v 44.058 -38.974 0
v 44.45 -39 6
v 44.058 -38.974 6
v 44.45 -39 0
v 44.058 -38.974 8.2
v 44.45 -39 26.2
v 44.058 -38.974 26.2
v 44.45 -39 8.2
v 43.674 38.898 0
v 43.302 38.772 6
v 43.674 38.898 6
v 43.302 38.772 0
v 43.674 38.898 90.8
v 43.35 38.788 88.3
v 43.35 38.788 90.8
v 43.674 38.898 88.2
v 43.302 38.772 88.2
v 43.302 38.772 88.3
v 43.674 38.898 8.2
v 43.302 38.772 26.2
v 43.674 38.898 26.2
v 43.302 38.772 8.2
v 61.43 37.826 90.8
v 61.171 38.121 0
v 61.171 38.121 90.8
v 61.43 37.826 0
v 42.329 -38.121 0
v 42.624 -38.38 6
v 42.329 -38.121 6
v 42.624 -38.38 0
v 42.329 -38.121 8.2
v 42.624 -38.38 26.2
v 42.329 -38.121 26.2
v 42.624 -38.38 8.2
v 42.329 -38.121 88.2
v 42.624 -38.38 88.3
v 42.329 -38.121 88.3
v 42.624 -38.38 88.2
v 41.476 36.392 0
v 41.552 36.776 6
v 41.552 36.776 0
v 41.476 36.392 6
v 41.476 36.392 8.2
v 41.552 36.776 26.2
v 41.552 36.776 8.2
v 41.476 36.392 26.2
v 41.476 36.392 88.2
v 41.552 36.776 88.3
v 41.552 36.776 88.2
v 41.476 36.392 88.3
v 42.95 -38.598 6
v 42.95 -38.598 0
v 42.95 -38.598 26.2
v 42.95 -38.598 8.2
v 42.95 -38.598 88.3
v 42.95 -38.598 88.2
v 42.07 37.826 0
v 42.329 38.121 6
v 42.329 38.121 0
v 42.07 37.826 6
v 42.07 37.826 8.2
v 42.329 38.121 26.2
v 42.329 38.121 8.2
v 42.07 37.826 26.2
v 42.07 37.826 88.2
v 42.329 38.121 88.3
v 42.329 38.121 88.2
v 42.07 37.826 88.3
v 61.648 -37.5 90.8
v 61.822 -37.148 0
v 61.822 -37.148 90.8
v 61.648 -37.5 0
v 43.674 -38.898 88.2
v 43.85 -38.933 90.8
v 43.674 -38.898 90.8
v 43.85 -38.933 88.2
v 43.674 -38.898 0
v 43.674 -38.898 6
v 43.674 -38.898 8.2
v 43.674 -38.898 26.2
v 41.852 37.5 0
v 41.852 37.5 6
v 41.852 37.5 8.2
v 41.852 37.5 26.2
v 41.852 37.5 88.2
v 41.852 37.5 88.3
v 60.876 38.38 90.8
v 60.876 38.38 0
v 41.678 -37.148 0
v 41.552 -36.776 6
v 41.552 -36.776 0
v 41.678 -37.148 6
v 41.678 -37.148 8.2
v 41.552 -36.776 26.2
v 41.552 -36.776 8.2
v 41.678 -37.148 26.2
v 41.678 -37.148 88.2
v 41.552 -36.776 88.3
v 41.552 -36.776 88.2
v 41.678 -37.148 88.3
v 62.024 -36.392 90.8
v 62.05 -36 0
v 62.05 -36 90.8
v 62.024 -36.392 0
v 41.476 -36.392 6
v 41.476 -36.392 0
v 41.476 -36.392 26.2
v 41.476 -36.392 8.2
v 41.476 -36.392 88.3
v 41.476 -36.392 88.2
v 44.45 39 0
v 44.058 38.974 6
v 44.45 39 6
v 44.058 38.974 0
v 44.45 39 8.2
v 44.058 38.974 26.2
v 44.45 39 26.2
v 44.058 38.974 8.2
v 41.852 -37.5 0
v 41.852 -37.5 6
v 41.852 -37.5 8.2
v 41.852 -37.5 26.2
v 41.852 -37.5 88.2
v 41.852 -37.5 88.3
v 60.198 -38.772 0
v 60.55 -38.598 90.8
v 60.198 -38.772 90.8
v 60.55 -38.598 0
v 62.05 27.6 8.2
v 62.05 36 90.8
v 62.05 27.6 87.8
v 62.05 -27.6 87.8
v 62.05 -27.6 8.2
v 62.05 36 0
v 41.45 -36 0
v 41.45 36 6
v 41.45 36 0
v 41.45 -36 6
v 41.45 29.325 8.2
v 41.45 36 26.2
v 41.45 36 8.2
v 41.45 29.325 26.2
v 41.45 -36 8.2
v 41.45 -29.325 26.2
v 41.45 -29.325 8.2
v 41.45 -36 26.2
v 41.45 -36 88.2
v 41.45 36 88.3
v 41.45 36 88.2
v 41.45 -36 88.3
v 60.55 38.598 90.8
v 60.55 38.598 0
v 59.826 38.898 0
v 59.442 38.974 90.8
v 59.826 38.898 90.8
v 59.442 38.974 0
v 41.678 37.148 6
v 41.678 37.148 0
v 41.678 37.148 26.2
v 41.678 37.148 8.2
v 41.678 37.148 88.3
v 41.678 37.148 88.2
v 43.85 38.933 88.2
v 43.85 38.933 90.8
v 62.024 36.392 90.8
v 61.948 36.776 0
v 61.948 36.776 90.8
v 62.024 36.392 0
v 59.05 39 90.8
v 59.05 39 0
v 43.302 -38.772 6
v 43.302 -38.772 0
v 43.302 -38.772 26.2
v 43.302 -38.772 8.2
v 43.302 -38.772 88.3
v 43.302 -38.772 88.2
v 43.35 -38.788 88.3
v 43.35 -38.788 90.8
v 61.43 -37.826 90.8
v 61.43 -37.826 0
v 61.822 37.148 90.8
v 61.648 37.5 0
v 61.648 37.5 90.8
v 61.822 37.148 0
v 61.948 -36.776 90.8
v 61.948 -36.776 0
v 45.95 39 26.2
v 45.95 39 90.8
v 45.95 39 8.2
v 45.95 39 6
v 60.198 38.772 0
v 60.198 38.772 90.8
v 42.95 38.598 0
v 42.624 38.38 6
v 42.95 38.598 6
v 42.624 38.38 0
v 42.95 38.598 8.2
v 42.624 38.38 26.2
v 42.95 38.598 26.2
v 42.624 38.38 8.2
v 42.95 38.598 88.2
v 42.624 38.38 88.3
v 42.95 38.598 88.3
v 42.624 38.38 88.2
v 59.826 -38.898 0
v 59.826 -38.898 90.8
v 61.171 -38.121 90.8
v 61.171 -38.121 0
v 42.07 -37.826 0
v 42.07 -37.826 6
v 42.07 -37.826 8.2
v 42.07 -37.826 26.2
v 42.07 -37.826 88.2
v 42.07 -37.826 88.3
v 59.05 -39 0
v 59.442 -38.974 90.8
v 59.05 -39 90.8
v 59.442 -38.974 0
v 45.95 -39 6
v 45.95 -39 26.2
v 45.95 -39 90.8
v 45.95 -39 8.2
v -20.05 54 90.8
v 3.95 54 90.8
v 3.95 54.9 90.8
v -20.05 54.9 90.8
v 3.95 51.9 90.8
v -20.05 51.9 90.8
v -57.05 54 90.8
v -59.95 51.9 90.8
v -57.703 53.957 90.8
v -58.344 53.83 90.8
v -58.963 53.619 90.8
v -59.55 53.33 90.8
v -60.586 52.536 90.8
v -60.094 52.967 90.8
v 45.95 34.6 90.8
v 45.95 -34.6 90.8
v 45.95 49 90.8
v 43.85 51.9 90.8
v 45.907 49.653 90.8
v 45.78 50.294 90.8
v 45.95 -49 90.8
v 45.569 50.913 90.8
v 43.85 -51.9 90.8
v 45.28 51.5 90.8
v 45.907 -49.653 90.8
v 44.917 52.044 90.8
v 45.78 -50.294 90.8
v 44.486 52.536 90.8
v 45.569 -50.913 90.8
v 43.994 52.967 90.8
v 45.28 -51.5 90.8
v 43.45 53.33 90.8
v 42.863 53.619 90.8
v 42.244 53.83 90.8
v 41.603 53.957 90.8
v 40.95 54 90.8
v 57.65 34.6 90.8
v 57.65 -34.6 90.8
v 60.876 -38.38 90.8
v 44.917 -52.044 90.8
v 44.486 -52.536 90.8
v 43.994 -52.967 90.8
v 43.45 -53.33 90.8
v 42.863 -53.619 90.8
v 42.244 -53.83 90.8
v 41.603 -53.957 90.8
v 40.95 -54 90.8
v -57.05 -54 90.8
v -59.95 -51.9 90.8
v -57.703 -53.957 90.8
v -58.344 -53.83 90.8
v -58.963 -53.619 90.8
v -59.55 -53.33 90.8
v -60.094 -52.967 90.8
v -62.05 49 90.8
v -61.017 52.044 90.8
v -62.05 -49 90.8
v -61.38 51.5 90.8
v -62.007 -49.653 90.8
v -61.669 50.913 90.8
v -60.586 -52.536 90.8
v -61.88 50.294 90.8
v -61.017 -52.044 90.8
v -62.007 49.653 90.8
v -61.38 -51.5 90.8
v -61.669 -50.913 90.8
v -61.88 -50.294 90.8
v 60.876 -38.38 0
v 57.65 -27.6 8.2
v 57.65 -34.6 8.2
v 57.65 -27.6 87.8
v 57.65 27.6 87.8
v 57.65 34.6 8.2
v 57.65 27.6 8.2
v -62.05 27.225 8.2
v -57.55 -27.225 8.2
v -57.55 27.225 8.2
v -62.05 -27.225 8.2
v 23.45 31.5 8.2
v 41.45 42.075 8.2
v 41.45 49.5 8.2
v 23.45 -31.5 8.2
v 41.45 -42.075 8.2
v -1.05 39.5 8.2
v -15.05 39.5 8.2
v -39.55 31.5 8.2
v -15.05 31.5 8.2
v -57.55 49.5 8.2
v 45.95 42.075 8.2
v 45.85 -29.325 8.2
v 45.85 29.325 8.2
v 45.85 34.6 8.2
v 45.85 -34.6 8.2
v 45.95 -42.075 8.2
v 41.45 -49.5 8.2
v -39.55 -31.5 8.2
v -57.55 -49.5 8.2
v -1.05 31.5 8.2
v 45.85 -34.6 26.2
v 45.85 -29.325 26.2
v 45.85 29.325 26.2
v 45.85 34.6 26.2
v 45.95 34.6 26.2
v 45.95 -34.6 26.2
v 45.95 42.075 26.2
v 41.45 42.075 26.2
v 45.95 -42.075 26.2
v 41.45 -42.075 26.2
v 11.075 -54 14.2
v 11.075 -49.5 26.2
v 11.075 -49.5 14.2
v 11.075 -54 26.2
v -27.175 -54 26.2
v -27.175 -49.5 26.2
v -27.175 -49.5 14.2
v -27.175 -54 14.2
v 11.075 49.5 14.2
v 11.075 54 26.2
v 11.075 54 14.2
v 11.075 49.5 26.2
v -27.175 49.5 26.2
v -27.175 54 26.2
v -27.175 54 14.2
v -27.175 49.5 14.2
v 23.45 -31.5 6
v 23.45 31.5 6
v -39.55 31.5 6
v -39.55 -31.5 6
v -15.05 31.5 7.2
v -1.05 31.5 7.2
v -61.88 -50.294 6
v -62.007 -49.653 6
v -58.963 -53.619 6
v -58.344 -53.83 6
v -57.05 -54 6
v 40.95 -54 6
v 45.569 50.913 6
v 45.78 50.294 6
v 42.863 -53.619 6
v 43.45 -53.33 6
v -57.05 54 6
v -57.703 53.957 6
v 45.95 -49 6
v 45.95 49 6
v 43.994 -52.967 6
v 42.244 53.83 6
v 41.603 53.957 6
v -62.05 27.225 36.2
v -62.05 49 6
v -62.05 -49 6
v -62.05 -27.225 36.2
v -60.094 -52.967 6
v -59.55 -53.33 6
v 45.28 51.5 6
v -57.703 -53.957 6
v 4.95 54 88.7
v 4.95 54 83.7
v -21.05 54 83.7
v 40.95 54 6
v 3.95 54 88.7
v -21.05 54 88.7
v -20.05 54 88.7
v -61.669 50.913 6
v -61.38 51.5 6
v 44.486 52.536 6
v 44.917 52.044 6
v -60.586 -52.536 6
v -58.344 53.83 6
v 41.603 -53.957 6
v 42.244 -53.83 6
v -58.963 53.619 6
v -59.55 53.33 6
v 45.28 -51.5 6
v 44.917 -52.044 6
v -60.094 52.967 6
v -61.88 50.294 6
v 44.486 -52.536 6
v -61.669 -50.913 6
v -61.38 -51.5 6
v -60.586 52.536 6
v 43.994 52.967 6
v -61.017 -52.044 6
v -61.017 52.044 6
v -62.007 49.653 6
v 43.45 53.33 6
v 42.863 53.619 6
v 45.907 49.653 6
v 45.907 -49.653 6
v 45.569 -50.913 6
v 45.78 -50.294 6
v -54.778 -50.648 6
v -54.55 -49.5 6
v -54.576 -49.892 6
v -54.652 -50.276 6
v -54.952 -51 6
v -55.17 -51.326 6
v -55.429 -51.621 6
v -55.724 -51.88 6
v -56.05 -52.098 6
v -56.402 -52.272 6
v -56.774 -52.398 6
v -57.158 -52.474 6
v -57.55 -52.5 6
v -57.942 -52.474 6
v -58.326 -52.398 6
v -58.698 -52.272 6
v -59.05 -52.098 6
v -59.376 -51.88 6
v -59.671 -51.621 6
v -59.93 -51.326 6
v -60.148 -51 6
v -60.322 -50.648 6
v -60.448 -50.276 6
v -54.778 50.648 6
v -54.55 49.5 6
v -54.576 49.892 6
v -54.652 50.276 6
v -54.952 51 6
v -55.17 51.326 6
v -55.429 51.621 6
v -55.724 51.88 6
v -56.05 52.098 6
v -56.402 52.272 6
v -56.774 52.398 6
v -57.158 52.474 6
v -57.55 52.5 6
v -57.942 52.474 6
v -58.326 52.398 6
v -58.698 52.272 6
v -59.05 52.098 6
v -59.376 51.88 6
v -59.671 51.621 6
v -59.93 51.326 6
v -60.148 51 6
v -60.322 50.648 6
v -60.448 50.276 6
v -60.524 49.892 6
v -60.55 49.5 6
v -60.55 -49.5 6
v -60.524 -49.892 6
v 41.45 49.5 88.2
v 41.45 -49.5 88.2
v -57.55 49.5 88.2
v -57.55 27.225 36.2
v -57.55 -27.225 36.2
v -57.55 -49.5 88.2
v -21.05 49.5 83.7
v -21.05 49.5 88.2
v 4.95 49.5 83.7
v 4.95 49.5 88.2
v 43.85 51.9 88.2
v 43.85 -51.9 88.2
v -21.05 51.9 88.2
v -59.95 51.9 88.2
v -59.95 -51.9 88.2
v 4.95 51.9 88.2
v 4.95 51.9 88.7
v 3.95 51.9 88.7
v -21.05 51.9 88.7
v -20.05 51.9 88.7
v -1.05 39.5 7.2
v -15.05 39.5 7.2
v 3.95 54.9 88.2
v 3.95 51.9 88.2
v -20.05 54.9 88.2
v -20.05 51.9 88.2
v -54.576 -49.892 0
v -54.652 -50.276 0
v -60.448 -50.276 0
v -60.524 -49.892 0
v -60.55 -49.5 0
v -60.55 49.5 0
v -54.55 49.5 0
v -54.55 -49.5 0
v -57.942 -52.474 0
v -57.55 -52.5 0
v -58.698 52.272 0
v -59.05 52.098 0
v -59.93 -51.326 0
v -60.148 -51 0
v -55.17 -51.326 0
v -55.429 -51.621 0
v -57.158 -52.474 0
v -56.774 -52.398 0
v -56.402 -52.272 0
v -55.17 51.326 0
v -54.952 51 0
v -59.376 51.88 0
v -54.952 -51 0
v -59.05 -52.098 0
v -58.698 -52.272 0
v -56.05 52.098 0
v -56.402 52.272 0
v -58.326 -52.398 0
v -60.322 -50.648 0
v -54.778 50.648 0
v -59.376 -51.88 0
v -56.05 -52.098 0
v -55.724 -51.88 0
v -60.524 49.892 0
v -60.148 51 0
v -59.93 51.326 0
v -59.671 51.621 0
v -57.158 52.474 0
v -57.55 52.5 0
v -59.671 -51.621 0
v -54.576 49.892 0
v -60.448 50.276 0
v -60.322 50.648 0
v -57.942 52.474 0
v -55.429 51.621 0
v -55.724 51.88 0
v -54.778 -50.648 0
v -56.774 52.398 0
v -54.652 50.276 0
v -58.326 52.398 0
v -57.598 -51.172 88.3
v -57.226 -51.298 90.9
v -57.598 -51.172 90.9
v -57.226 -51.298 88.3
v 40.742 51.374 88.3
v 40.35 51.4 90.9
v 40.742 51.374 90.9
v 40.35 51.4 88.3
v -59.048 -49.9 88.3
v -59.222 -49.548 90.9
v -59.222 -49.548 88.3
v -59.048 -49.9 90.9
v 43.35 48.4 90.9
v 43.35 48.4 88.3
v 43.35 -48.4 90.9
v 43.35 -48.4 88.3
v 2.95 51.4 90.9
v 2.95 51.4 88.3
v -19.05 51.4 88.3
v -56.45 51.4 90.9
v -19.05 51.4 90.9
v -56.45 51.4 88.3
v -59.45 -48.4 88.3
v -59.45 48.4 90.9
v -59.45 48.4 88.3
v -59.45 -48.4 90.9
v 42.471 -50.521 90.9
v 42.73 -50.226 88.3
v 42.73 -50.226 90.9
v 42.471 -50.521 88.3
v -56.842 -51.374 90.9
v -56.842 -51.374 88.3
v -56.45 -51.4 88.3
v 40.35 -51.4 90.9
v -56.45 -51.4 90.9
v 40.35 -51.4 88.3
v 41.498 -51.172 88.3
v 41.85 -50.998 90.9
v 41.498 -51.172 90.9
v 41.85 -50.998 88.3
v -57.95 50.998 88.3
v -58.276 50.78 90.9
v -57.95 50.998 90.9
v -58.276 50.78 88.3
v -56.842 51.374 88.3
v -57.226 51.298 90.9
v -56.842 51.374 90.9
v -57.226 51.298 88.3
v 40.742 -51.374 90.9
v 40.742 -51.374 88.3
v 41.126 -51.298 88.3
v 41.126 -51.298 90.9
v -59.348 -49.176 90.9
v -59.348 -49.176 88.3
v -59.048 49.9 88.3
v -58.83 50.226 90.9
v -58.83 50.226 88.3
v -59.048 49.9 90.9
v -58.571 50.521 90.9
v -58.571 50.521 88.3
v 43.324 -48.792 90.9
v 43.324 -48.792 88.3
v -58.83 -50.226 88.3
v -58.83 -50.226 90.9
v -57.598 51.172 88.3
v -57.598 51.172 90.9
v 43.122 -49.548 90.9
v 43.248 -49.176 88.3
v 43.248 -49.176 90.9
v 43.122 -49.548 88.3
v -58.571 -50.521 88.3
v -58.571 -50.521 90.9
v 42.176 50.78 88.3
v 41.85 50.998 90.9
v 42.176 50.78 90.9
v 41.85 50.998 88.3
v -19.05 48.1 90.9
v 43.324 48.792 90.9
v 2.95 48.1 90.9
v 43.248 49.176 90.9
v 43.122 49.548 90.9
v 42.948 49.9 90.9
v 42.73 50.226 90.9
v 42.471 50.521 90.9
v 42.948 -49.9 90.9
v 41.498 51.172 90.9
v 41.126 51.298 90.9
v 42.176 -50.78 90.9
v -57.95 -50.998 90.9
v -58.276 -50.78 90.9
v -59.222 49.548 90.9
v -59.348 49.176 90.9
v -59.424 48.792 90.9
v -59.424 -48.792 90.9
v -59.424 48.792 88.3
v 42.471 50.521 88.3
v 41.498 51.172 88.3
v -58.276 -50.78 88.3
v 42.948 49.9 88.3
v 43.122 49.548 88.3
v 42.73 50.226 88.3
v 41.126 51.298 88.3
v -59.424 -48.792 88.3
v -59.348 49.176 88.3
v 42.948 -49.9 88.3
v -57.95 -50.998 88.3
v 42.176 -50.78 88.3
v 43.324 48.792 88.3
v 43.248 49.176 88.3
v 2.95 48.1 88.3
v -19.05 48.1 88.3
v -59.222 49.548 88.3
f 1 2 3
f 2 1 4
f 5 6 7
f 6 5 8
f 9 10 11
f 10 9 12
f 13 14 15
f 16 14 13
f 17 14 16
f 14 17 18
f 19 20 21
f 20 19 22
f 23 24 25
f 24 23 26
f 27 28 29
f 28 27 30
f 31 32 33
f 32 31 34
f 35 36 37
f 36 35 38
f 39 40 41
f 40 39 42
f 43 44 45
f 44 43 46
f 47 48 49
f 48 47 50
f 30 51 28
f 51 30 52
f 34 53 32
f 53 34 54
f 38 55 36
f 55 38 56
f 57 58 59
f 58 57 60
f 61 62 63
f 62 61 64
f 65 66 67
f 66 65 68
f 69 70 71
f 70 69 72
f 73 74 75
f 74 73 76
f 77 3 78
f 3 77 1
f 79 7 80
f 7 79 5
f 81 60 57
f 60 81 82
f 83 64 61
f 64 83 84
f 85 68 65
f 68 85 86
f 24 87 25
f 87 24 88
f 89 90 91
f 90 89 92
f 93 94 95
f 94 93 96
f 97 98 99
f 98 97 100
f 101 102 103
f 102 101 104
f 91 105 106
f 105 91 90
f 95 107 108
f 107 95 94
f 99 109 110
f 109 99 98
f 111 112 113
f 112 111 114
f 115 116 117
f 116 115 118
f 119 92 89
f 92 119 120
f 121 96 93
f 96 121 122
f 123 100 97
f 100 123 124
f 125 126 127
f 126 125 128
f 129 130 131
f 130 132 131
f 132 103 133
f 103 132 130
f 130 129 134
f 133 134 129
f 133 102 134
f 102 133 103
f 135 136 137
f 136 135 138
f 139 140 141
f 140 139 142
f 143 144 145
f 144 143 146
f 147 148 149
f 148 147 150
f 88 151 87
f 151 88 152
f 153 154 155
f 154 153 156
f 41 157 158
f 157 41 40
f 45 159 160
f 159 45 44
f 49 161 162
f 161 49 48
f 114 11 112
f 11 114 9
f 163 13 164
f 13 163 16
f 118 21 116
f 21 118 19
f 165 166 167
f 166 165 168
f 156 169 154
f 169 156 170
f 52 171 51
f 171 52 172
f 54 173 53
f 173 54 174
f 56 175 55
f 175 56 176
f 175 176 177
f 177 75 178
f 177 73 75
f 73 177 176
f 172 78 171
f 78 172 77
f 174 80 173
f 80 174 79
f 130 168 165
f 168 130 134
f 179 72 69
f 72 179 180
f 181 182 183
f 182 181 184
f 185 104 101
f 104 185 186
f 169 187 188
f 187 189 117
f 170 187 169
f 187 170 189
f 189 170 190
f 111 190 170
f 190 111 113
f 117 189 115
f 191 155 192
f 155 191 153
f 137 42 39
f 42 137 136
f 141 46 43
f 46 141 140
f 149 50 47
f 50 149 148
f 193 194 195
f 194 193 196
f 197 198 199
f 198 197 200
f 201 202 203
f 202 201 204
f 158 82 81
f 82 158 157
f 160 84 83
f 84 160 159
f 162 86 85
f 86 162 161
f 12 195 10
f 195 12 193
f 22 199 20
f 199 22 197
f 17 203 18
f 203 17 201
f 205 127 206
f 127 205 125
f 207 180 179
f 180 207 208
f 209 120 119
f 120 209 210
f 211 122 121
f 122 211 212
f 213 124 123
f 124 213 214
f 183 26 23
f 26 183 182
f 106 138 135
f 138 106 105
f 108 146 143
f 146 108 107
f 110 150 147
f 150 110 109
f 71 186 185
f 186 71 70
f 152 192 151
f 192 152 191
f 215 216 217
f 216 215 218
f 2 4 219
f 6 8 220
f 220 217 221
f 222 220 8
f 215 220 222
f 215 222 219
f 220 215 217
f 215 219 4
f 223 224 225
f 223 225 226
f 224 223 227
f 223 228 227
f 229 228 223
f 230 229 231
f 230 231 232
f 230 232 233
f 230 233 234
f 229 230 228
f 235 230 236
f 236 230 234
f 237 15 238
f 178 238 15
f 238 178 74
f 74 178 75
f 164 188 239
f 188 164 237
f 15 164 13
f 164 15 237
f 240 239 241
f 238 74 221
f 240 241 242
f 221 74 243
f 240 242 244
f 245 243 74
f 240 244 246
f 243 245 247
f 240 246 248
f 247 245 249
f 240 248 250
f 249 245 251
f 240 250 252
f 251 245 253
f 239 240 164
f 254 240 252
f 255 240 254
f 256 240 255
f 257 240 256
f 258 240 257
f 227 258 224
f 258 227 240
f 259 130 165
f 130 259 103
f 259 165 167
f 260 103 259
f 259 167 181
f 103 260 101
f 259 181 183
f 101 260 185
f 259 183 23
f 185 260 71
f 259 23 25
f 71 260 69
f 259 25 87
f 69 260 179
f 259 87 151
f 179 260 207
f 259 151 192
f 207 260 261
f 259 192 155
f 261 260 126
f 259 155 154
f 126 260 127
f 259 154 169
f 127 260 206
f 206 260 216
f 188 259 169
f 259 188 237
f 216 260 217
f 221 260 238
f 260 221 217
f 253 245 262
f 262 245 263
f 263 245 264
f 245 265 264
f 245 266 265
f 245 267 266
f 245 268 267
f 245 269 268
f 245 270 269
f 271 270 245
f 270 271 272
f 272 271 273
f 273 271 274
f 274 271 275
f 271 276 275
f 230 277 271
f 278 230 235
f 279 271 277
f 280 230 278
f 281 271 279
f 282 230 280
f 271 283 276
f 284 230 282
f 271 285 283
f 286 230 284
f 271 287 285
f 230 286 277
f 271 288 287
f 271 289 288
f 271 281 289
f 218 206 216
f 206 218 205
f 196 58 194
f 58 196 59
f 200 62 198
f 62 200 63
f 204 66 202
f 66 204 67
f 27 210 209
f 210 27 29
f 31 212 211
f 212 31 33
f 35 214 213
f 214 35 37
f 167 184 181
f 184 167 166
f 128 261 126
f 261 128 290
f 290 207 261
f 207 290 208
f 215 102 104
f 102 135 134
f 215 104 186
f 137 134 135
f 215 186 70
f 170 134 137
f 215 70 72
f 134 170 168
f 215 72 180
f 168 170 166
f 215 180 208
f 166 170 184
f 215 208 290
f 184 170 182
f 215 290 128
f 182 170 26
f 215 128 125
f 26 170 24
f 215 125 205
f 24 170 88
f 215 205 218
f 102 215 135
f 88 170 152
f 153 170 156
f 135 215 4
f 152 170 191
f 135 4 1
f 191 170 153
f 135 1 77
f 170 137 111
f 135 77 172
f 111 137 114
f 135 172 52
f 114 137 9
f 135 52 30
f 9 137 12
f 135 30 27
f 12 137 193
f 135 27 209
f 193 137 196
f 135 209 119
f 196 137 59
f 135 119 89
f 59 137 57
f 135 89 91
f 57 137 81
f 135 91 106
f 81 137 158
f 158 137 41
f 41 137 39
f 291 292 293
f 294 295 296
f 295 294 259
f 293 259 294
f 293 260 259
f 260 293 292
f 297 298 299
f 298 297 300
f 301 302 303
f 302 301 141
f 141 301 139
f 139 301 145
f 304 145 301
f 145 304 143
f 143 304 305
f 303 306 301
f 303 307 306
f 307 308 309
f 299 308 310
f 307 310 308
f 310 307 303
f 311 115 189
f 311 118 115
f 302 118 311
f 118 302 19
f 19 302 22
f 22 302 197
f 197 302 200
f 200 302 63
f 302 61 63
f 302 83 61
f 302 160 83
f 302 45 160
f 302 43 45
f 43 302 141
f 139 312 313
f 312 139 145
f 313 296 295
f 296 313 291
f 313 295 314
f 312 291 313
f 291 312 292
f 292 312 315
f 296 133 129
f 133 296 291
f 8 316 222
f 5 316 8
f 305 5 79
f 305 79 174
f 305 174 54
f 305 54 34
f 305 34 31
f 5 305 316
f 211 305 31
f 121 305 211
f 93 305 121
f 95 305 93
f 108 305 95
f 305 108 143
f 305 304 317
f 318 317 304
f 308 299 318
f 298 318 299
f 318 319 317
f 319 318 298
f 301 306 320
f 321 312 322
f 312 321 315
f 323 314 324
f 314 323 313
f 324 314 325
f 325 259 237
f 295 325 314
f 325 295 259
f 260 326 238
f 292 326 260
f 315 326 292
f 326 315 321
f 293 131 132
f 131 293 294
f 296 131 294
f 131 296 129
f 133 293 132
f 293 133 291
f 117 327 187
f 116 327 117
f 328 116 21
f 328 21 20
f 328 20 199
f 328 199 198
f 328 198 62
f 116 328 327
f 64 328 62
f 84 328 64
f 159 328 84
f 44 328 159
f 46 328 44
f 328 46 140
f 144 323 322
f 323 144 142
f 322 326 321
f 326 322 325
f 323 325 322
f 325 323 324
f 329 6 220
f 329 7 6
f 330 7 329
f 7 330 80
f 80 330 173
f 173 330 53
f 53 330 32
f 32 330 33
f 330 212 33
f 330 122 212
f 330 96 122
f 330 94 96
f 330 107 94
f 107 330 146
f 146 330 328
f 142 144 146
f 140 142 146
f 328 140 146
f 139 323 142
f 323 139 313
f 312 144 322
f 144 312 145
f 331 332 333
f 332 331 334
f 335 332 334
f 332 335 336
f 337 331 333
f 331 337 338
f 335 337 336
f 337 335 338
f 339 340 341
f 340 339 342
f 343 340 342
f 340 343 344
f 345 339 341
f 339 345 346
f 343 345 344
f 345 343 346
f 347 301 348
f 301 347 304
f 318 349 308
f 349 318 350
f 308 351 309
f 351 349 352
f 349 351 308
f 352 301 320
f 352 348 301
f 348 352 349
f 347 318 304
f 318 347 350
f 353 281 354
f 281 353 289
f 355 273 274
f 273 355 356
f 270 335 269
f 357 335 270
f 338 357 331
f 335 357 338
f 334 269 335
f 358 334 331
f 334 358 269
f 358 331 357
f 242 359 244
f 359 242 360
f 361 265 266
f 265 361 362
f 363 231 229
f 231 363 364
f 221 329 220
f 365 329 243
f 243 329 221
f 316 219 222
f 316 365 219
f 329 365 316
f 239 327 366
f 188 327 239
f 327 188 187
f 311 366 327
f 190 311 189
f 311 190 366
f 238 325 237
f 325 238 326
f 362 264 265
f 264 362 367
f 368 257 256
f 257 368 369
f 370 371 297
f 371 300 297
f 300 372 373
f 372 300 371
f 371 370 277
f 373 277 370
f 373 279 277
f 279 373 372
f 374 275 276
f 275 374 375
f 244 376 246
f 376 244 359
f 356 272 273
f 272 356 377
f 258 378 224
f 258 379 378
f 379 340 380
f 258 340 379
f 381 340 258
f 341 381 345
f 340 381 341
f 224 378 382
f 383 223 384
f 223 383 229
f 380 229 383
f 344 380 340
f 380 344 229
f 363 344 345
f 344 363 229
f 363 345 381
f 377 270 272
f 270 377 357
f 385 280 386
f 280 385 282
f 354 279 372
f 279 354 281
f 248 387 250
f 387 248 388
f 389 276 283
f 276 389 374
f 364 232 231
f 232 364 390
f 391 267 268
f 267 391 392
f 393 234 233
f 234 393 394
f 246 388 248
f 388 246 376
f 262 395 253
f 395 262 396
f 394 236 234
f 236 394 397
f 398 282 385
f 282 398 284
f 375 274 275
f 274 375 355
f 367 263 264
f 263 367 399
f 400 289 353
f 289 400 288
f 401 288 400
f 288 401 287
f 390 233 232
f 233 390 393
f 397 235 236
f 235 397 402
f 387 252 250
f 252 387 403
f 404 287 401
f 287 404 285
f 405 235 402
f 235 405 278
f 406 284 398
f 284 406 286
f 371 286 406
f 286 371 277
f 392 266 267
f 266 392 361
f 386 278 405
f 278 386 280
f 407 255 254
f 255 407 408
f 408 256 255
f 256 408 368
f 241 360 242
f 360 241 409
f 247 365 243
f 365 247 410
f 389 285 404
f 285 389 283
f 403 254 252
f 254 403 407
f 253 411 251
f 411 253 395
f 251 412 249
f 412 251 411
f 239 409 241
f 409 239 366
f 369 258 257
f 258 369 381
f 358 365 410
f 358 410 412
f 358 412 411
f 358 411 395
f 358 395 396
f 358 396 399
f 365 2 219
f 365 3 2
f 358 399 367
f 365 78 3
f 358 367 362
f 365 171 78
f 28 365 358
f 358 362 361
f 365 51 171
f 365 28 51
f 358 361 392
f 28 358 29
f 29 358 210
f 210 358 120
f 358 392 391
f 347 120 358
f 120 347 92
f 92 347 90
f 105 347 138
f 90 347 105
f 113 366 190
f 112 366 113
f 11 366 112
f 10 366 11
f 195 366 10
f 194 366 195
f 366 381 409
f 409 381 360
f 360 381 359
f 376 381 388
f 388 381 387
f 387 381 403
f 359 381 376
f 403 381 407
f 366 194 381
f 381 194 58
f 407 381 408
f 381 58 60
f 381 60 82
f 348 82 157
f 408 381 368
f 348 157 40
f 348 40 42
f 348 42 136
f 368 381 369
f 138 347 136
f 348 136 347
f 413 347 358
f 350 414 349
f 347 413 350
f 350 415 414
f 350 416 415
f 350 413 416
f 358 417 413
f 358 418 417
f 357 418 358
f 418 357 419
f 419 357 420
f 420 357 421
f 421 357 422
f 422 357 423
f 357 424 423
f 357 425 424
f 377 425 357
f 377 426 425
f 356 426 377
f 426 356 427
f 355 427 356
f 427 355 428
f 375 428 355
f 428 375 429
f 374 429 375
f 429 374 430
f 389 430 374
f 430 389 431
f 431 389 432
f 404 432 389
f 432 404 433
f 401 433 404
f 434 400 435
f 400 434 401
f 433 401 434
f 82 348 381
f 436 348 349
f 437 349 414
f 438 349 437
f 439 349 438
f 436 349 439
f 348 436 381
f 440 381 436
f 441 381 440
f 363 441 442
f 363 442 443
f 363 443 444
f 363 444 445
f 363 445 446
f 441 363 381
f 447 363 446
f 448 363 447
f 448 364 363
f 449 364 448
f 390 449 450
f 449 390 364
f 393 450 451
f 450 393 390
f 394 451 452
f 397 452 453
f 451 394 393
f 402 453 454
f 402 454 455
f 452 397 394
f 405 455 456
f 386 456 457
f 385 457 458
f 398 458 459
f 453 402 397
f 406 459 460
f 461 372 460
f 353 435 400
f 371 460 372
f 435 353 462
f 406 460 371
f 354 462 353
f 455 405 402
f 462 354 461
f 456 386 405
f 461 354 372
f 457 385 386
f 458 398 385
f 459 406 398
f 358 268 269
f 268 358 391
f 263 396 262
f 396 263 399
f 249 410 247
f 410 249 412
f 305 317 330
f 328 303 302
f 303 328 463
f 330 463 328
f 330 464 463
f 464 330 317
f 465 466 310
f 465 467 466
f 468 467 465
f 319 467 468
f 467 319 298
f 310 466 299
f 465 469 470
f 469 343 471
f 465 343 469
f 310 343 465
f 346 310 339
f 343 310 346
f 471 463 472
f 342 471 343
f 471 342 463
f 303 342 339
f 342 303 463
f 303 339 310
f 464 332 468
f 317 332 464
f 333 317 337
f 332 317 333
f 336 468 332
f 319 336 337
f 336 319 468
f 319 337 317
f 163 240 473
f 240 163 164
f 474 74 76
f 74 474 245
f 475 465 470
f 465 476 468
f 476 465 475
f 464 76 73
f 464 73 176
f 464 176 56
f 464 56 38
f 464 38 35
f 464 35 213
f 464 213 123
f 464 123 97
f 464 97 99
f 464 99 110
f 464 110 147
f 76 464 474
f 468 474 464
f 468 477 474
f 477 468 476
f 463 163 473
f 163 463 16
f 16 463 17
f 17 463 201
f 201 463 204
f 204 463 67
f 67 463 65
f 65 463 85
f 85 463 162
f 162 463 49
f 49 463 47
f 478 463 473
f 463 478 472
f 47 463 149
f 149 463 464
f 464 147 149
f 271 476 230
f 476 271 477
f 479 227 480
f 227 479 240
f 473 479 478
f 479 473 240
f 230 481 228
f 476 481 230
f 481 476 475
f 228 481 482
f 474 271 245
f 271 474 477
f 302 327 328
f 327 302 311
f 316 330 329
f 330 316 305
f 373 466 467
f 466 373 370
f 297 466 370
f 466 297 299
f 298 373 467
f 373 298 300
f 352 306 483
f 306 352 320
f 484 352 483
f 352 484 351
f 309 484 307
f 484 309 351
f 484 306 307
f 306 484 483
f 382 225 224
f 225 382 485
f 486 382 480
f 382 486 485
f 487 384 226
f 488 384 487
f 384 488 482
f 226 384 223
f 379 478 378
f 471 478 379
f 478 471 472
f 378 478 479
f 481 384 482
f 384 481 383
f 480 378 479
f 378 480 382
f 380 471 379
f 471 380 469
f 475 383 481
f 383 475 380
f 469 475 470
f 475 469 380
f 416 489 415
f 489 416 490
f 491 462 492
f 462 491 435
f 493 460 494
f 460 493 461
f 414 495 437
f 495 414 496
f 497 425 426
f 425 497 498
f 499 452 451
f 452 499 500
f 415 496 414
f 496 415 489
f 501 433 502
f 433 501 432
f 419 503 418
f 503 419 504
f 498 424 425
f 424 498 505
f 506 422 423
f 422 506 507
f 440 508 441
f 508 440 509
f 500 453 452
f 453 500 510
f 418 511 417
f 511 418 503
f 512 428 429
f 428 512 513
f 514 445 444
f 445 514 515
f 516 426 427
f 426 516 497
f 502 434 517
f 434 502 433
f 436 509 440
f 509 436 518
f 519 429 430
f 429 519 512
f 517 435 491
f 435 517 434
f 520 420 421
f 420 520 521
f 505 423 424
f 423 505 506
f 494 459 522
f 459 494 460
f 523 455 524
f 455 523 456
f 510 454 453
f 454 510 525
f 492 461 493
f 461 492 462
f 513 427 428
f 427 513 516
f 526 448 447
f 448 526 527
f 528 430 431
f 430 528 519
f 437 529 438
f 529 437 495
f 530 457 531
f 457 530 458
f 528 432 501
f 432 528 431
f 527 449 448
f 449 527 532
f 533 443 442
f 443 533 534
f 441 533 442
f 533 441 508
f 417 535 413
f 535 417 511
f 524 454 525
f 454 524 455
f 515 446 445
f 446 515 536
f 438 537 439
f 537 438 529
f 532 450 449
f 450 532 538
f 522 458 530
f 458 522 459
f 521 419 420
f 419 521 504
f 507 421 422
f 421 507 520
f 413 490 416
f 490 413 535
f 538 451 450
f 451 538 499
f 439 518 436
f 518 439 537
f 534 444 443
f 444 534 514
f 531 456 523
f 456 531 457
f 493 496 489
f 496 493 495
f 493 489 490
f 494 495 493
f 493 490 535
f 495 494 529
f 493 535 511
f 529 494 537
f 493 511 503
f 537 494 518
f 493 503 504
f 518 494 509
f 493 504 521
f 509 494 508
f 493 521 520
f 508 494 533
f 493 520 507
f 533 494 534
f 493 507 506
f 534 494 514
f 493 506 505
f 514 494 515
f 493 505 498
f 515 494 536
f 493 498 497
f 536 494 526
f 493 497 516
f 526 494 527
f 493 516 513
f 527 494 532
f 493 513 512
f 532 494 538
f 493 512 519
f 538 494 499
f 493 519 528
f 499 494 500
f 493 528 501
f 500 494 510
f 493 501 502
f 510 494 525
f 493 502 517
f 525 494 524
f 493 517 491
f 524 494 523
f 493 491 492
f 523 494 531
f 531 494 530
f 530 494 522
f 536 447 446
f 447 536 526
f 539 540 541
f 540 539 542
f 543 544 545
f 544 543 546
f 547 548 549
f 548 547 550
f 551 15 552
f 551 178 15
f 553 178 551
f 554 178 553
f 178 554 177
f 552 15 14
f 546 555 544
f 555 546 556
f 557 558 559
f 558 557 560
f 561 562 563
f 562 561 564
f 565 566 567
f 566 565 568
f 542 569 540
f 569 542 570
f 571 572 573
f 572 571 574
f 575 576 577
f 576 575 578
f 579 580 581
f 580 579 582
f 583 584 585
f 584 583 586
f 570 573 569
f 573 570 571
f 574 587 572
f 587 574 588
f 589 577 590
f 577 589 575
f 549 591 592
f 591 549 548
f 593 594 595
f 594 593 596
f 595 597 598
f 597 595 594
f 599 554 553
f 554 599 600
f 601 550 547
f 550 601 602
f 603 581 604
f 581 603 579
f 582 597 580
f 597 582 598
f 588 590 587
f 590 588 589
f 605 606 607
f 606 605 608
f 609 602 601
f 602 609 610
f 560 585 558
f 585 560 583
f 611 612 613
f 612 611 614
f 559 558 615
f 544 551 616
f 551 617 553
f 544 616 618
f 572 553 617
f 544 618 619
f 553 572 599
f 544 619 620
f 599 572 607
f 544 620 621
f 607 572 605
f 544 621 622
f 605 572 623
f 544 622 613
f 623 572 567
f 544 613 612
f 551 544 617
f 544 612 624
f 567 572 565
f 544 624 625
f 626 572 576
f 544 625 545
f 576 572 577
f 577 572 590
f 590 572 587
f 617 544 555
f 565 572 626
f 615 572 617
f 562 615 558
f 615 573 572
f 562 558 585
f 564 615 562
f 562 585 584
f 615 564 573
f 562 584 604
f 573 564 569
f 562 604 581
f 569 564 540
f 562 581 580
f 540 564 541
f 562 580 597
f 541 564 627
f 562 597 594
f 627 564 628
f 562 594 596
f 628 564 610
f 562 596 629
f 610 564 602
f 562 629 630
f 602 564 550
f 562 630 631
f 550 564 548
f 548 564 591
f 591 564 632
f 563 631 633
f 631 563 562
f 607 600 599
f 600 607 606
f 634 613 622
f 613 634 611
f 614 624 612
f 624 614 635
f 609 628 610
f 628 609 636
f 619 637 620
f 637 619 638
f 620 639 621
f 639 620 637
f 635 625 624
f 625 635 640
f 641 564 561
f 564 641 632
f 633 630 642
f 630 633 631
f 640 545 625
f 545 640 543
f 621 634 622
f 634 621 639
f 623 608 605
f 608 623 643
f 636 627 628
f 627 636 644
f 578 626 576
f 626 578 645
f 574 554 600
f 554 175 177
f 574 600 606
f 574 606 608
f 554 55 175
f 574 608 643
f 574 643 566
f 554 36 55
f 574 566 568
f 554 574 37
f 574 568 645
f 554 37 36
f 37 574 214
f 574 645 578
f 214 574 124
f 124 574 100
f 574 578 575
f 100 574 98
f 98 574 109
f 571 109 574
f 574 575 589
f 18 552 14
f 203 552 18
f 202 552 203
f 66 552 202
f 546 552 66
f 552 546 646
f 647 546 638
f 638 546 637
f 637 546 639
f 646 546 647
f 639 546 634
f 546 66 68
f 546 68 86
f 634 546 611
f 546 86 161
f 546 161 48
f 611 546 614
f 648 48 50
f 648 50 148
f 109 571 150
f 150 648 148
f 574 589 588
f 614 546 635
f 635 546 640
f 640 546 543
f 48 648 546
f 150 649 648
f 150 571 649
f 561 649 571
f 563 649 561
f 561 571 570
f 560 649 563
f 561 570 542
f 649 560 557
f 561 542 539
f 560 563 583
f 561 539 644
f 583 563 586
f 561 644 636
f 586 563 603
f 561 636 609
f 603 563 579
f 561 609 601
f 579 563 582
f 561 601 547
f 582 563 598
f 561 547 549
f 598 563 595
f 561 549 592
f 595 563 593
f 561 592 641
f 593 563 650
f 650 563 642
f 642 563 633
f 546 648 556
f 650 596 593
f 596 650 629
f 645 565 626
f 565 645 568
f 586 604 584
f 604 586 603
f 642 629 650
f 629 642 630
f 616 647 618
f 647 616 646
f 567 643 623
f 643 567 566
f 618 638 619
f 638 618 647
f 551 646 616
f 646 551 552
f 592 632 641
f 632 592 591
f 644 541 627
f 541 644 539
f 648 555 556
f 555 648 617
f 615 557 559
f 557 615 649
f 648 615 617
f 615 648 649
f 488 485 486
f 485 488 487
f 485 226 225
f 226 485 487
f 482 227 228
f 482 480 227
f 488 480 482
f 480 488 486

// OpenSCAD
// Echo Pyramid dock v7
// - Vertical power-bank bay on the SIDE
// - Pyramid chamber walls INTEGRAL, thicker walls + step seat
// - Flat plate lid: slightly smaller, rests on the step (no magnets)
// - Small pry opening at front to lift the lid
// - Full bottom passage platform <-> bay
//
// part = "base" | "lid" | "assembly"

part = "assembly";

/* ===== measured power bank ===== */
pb_l = 99.8;
pb_w = 66.6;
pb_t = 9.2;
pb_clear = 1.2;   // per-side gap for FDM + easy slide-in (was 0.8)

/* ===== Pyramid + Atom ===== */
pyramid_xy = 83.6;     // measured Pyramid outer (reference)
pyramid_clear = 0.7;   // unused when chamber_inner is set explicitly
post_h = 0;            // no internal posts — Pyramid sits on chamber floor
post_size = 8.0;
stack_h = 80.0; // floor → underside of flat lid
chamber_inner = 99.0;  // Pyramid 仓内净空 XY（含装配间隙）

/* ===== box (thicker walls) ===== */
wall = 4.5;            // thick chamber wall
floor_t = 2.2;
corner_r = 5.0;
rim = 1.5;             // legacy (chamber size uses chamber_inner)
bay_gap = 0;           // no gap — shared wall with battery bay (saves material)
// Shared low cable passage through the shared wall
cable_pass_h = 18.0;
// Opening on Pyramid wall OPPOSITE the battery bay (outer -X) for mic
bank_wall_open_h = 28.0;   // modest mic window (was 48)
bank_wall_open_y = 0.55;   // fraction of zone_d

/* ===== underside feet (Pyramid side only; battery tower is the other support) ===== */
foot_h = 6.0;          // clearance under floor for sound
foot_strip_w = 6.0;    // thin arc-strip width (saves material vs pad feet)
foot_inset = 1.5;      // pull in from outer outline

/* ===== step seat + flat lid (no magnets) ===== */
lid_t = 2.6;
step = 2.4;            // horizontal ledge the lid sits on
rim_lip = wall - step; // outer lip above the step (keeps lid from sliding out)
lid_clear = 0.5;       // lid slightly smaller than seat opening
pry_w = 24.0;          // front pry opening width
pry_cut = 3.5;         // how deep pry bite cuts into lid front edge

show_ghosts = false;
show_notch_marker = true;

/* ===== derived ===== */
eps = 0.2;
$fn = 48;

bay_xi = pb_t + 2 * pb_clear;
bay_yi = pb_w + 2 * pb_clear;
bay_zi = pb_l + 2 * pb_clear;  // clearance top and bottom

cradle_i = pyramid_xy + 2 * pyramid_clear;
zone_w = chamber_inner;
zone_d = chamber_inner;

plat_outer_w = zone_w + 2 * wall;
plat_outer_d = zone_d + 2 * wall;

// Shared wall: chamber + battery cavity + one outer wall (no bay_gap, no double wall)
// [chamber left wall|zone|SHARED wall|bay|tower outer wall]
outer_w = zone_w + wall + bay_xi + wall + wall; // = plat_outer_w + bay_xi + wall
outer_d = plat_outer_d;

chamber_h = floor_t + post_h + stack_h;
box_h = chamber_h + lid_t;
tower_h = floor_t + bay_zi + 1.5;

pyr_x = -outer_w / 2 + plat_outer_w / 2;
pyr_y = 0;
// Battery cavity center: immediately outside the shared wall
bay_x = -outer_w / 2 + plat_outer_w + bay_xi / 2;
bay_y = 0;
bay_z = floor_t + bay_zi / 2;

// Seat opening (where lid drops in) = inner + 2*step
seat_w = zone_w + 2 * step;
seat_d = zone_d + 2 * step;
// Lid slightly smaller than seat
lid_w = seat_w - 2 * lid_clear;
lid_d = seat_d - 2 * lid_clear;

module rounded_box(x, y, z, r) {
    hull() for (sx = [-1, 1], sy = [-1, 1])
        translate([sx * (x / 2 - r), sy * (y / 2 - r), 0])
            cylinder(h = z, r = r);
}

module feet() {
    // Single thin stadium strip under Pyramid chamber -X edge:
    // straight bar + rounded ends (圆弧条状), less material than two pad feet.
    overlap = 0.8;
    x = pyr_x - plat_outer_w / 2 + foot_strip_w / 2 + foot_inset;
    y_span = plat_outer_d / 2 - foot_strip_w / 2 - foot_inset;
    hull() {
        for (sy = [-1, 1])
            translate([x, sy * y_span, 0])
                cylinder(h = foot_h + overlap, r = foot_strip_w / 2);
    }
}

module posts() {
    // Intentionally empty — no floor bumps in Pyramid chamber
}

module acoustic_vents() {
    // Floor: one opening for speaker — smaller hole, wider frame
    floor_frame = 18.0;
    translate([pyr_x, pyr_y, floor_t / 2])
        cube([
            max(10, zone_w - 2 * floor_frame),
            max(10, zone_d - 2 * floor_frame),
            floor_t + 2
        ], center = true);

    // Side wall vents (front/back) for extra airflow
    for (sy = [-1, 1])
        translate([pyr_x, sy * (plat_outer_d / 2 - wall / 2), floor_t + 12])
            cube([cradle_i * 0.45, wall + 2, 12], center = true);
}

module pyramid_chamber() {
    // Thick walls + step: lid rests on step, held by outer rim_lip
    difference() {
        translate([pyr_x, pyr_y, 0])
            rounded_box(plat_outer_w, plat_outer_d, box_h, corner_r);

        // Inner well up to seat height
        translate([pyr_x, pyr_y, floor_t + chamber_h / 2 + eps / 2])
            cube([zone_w, zone_d, chamber_h + eps], center = true);

        // Seat recess (step): opening through top, leaves rim_lip around outside
        translate([pyr_x, pyr_y, chamber_h + lid_t / 2 + eps / 2])
            cube([seat_w, seat_d, lid_t + eps], center = true);

        // Cable / airflow toward bank (+X) — modest pass only
        translate([pyr_x + zone_w / 2 + wall / 2, pyr_y, floor_t + cable_pass_h / 2])
            cube([wall + 4, zone_d * 0.85, cable_pass_h], center = true);
        // Opposite wall (-X, away from bank): larger opening for mic
        translate([
            pyr_x - zone_w / 2 - wall / 2,
            pyr_y,
            floor_t + bank_wall_open_h / 2
        ])
            cube([
                wall + 4,
                zone_d * bank_wall_open_y,
                bank_wall_open_h
            ], center = true);
        // Extra low USB approach under Pyramid
        translate([pyr_x, pyr_y + cradle_i / 2 - 12, floor_t + 3.5])
            cube([14, 18, 9], center = true);

        acoustic_vents();

        // Front pry gap: cut through outer rim lip so nail can get under lid
        translate([
            pyr_x,
            plat_outer_d / 2 - rim_lip / 2,
            chamber_h + lid_t / 2
        ])
            cube([pry_w, rim_lip + 2, lid_t + 2], center = true);
        // Slight scoop below seat for fingernail
        translate([pyr_x, plat_outer_d / 2 - wall / 2, chamber_h - 2])
            cube([pry_w + 2, wall + 2, 5], center = true);
    }
}

module bank_tower() {
    // Height flush with Pyramid chamber roof; power bank may stick out the top.
    tw = bay_xi + 2 * wall;
    td = bay_yi + 2 * wall;
    total_h = foot_h + box_h;   // same top as Pyramid chamber
    side_win_y = bay_yi * 0.80;
    side_win_bot = foot_h + floor_t;
    // Window up to near the flush top (leave a small rim)
    side_win_top = total_h - 3;
    side_win_h = max(10, side_win_top - side_win_bot);
    bay_cavity_h = total_h - foot_h - floor_t + eps; // open through top
    difference() {
        translate([bay_x, bay_y, 0])
            rounded_box(tw, td, total_h, max(2, corner_r - 2));

        // Battery cavity from pedestal top through the open roof
        translate([
            bay_x,
            bay_y,
            foot_h + floor_t + bay_cavity_h / 2
        ])
            cube([bay_xi + eps, bay_yi + eps, bay_cavity_h], center = true);

        translate([
            outer_w / 2 - wall / 2,
            bay_y,
            side_win_bot + side_win_h / 2
        ])
            cube([wall + 4, side_win_y, side_win_h], center = true);

        // Fully open top (power bank may protrude)
        translate([bay_x, bay_y, total_h - 1])
            cube([bay_xi * 0.98, bay_yi * 0.98, 4], center = true);

        // Cable pass through shared wall
        translate([
            bay_x - bay_xi / 2 - wall / 2,
            bay_y,
            foot_h + floor_t + cable_pass_h / 2
        ])
            cube([wall + 6, min(bay_yi, zone_d) * 0.85, cable_pass_h], center = true);
    }
}

module bridge_floor() {
    // No gap to bridge when walls are shared
}

module base_part() {
    union() {
        feet();
        bank_tower();
        translate([0, 0, foot_h])
            pyramid_chamber();
    }
}

module lid_part() {
    // Flat plate, slightly smaller than seat; front pry bite
    difference() {
        rounded_box(lid_w, lid_d, lid_t, max(1.5, corner_r - 2));

        // Front edge bite — aligns with base pry gap
        translate([0, lid_d / 2 - pry_cut / 2 + 0.2, lid_t / 2])
            cube([pry_w - 2, pry_cut, lid_t + 1], center = true);
        translate([0, lid_d / 2 + 0.5, lid_t * 0.45])
            rotate([90, 0, 0])
                cylinder(h = pry_cut + 2, r = (pry_w - 2) * 0.22, center = true);
    }
}

module assembly() {
    base_part();
    translate([pyr_x, pyr_y, foot_h + chamber_h + 0.1])
        color([0.85, 0.88, 0.92, 0.8])
            lid_part();

    if (show_notch_marker)
        color([1, 0.15, 0.1, 0.9])
            translate([pyr_x, pyr_y + lid_d / 2 + 2, foot_h + chamber_h + lid_t / 2])
                cube([pry_w, 3, lid_t], center = true);
}

module ghosts() {
    color([0.2, 0.55, 0.95, 0.45])
        translate([bay_x, bay_y, foot_h + bay_z])
            cube([pb_t, pb_w, pb_l], center = true);
    color([0.95, 0.45, 0.15, 0.35])
        translate([pyr_x, pyr_y, foot_h + floor_t + post_h + stack_h / 2])
            cube([pyramid_xy, pyramid_xy, stack_h], center = true);
}

if (part == "base") {
    base_part();
} else if (part == "lid") {
    lid_part();
} else {
    assembly();
    if (show_ghosts) ghosts();
}

echo(str("Wall=", wall, " step=", step, " rim_lip=", rim_lip));
echo(str("Chamber inner ", zone_w, "x", zone_d, " (Pyramid ", pyramid_xy, " + gap ", (zone_w - pyramid_xy) / 2, "/side)"));
echo(str("Shared wall (bay_gap=", bay_gap, ") — outer_w=", outer_w));
echo(str("Support: arc-strip foot on Pyramid -X + battery tower to z=0"));
echo(str("Foot strip h=", foot_h, " w=", foot_strip_w));
echo(str("Chamber outer ", plat_outer_w, "x", plat_outer_d, "x", box_h));
echo(str("Seat ", seat_w, "x", seat_d, "  Lid ", lid_w, "x", lid_d, "x", lid_t));
echo(str("Pry gap w=", pry_w, " (no magnets)"));
echo("Export: part=\"base\" and part=\"lid\"");
